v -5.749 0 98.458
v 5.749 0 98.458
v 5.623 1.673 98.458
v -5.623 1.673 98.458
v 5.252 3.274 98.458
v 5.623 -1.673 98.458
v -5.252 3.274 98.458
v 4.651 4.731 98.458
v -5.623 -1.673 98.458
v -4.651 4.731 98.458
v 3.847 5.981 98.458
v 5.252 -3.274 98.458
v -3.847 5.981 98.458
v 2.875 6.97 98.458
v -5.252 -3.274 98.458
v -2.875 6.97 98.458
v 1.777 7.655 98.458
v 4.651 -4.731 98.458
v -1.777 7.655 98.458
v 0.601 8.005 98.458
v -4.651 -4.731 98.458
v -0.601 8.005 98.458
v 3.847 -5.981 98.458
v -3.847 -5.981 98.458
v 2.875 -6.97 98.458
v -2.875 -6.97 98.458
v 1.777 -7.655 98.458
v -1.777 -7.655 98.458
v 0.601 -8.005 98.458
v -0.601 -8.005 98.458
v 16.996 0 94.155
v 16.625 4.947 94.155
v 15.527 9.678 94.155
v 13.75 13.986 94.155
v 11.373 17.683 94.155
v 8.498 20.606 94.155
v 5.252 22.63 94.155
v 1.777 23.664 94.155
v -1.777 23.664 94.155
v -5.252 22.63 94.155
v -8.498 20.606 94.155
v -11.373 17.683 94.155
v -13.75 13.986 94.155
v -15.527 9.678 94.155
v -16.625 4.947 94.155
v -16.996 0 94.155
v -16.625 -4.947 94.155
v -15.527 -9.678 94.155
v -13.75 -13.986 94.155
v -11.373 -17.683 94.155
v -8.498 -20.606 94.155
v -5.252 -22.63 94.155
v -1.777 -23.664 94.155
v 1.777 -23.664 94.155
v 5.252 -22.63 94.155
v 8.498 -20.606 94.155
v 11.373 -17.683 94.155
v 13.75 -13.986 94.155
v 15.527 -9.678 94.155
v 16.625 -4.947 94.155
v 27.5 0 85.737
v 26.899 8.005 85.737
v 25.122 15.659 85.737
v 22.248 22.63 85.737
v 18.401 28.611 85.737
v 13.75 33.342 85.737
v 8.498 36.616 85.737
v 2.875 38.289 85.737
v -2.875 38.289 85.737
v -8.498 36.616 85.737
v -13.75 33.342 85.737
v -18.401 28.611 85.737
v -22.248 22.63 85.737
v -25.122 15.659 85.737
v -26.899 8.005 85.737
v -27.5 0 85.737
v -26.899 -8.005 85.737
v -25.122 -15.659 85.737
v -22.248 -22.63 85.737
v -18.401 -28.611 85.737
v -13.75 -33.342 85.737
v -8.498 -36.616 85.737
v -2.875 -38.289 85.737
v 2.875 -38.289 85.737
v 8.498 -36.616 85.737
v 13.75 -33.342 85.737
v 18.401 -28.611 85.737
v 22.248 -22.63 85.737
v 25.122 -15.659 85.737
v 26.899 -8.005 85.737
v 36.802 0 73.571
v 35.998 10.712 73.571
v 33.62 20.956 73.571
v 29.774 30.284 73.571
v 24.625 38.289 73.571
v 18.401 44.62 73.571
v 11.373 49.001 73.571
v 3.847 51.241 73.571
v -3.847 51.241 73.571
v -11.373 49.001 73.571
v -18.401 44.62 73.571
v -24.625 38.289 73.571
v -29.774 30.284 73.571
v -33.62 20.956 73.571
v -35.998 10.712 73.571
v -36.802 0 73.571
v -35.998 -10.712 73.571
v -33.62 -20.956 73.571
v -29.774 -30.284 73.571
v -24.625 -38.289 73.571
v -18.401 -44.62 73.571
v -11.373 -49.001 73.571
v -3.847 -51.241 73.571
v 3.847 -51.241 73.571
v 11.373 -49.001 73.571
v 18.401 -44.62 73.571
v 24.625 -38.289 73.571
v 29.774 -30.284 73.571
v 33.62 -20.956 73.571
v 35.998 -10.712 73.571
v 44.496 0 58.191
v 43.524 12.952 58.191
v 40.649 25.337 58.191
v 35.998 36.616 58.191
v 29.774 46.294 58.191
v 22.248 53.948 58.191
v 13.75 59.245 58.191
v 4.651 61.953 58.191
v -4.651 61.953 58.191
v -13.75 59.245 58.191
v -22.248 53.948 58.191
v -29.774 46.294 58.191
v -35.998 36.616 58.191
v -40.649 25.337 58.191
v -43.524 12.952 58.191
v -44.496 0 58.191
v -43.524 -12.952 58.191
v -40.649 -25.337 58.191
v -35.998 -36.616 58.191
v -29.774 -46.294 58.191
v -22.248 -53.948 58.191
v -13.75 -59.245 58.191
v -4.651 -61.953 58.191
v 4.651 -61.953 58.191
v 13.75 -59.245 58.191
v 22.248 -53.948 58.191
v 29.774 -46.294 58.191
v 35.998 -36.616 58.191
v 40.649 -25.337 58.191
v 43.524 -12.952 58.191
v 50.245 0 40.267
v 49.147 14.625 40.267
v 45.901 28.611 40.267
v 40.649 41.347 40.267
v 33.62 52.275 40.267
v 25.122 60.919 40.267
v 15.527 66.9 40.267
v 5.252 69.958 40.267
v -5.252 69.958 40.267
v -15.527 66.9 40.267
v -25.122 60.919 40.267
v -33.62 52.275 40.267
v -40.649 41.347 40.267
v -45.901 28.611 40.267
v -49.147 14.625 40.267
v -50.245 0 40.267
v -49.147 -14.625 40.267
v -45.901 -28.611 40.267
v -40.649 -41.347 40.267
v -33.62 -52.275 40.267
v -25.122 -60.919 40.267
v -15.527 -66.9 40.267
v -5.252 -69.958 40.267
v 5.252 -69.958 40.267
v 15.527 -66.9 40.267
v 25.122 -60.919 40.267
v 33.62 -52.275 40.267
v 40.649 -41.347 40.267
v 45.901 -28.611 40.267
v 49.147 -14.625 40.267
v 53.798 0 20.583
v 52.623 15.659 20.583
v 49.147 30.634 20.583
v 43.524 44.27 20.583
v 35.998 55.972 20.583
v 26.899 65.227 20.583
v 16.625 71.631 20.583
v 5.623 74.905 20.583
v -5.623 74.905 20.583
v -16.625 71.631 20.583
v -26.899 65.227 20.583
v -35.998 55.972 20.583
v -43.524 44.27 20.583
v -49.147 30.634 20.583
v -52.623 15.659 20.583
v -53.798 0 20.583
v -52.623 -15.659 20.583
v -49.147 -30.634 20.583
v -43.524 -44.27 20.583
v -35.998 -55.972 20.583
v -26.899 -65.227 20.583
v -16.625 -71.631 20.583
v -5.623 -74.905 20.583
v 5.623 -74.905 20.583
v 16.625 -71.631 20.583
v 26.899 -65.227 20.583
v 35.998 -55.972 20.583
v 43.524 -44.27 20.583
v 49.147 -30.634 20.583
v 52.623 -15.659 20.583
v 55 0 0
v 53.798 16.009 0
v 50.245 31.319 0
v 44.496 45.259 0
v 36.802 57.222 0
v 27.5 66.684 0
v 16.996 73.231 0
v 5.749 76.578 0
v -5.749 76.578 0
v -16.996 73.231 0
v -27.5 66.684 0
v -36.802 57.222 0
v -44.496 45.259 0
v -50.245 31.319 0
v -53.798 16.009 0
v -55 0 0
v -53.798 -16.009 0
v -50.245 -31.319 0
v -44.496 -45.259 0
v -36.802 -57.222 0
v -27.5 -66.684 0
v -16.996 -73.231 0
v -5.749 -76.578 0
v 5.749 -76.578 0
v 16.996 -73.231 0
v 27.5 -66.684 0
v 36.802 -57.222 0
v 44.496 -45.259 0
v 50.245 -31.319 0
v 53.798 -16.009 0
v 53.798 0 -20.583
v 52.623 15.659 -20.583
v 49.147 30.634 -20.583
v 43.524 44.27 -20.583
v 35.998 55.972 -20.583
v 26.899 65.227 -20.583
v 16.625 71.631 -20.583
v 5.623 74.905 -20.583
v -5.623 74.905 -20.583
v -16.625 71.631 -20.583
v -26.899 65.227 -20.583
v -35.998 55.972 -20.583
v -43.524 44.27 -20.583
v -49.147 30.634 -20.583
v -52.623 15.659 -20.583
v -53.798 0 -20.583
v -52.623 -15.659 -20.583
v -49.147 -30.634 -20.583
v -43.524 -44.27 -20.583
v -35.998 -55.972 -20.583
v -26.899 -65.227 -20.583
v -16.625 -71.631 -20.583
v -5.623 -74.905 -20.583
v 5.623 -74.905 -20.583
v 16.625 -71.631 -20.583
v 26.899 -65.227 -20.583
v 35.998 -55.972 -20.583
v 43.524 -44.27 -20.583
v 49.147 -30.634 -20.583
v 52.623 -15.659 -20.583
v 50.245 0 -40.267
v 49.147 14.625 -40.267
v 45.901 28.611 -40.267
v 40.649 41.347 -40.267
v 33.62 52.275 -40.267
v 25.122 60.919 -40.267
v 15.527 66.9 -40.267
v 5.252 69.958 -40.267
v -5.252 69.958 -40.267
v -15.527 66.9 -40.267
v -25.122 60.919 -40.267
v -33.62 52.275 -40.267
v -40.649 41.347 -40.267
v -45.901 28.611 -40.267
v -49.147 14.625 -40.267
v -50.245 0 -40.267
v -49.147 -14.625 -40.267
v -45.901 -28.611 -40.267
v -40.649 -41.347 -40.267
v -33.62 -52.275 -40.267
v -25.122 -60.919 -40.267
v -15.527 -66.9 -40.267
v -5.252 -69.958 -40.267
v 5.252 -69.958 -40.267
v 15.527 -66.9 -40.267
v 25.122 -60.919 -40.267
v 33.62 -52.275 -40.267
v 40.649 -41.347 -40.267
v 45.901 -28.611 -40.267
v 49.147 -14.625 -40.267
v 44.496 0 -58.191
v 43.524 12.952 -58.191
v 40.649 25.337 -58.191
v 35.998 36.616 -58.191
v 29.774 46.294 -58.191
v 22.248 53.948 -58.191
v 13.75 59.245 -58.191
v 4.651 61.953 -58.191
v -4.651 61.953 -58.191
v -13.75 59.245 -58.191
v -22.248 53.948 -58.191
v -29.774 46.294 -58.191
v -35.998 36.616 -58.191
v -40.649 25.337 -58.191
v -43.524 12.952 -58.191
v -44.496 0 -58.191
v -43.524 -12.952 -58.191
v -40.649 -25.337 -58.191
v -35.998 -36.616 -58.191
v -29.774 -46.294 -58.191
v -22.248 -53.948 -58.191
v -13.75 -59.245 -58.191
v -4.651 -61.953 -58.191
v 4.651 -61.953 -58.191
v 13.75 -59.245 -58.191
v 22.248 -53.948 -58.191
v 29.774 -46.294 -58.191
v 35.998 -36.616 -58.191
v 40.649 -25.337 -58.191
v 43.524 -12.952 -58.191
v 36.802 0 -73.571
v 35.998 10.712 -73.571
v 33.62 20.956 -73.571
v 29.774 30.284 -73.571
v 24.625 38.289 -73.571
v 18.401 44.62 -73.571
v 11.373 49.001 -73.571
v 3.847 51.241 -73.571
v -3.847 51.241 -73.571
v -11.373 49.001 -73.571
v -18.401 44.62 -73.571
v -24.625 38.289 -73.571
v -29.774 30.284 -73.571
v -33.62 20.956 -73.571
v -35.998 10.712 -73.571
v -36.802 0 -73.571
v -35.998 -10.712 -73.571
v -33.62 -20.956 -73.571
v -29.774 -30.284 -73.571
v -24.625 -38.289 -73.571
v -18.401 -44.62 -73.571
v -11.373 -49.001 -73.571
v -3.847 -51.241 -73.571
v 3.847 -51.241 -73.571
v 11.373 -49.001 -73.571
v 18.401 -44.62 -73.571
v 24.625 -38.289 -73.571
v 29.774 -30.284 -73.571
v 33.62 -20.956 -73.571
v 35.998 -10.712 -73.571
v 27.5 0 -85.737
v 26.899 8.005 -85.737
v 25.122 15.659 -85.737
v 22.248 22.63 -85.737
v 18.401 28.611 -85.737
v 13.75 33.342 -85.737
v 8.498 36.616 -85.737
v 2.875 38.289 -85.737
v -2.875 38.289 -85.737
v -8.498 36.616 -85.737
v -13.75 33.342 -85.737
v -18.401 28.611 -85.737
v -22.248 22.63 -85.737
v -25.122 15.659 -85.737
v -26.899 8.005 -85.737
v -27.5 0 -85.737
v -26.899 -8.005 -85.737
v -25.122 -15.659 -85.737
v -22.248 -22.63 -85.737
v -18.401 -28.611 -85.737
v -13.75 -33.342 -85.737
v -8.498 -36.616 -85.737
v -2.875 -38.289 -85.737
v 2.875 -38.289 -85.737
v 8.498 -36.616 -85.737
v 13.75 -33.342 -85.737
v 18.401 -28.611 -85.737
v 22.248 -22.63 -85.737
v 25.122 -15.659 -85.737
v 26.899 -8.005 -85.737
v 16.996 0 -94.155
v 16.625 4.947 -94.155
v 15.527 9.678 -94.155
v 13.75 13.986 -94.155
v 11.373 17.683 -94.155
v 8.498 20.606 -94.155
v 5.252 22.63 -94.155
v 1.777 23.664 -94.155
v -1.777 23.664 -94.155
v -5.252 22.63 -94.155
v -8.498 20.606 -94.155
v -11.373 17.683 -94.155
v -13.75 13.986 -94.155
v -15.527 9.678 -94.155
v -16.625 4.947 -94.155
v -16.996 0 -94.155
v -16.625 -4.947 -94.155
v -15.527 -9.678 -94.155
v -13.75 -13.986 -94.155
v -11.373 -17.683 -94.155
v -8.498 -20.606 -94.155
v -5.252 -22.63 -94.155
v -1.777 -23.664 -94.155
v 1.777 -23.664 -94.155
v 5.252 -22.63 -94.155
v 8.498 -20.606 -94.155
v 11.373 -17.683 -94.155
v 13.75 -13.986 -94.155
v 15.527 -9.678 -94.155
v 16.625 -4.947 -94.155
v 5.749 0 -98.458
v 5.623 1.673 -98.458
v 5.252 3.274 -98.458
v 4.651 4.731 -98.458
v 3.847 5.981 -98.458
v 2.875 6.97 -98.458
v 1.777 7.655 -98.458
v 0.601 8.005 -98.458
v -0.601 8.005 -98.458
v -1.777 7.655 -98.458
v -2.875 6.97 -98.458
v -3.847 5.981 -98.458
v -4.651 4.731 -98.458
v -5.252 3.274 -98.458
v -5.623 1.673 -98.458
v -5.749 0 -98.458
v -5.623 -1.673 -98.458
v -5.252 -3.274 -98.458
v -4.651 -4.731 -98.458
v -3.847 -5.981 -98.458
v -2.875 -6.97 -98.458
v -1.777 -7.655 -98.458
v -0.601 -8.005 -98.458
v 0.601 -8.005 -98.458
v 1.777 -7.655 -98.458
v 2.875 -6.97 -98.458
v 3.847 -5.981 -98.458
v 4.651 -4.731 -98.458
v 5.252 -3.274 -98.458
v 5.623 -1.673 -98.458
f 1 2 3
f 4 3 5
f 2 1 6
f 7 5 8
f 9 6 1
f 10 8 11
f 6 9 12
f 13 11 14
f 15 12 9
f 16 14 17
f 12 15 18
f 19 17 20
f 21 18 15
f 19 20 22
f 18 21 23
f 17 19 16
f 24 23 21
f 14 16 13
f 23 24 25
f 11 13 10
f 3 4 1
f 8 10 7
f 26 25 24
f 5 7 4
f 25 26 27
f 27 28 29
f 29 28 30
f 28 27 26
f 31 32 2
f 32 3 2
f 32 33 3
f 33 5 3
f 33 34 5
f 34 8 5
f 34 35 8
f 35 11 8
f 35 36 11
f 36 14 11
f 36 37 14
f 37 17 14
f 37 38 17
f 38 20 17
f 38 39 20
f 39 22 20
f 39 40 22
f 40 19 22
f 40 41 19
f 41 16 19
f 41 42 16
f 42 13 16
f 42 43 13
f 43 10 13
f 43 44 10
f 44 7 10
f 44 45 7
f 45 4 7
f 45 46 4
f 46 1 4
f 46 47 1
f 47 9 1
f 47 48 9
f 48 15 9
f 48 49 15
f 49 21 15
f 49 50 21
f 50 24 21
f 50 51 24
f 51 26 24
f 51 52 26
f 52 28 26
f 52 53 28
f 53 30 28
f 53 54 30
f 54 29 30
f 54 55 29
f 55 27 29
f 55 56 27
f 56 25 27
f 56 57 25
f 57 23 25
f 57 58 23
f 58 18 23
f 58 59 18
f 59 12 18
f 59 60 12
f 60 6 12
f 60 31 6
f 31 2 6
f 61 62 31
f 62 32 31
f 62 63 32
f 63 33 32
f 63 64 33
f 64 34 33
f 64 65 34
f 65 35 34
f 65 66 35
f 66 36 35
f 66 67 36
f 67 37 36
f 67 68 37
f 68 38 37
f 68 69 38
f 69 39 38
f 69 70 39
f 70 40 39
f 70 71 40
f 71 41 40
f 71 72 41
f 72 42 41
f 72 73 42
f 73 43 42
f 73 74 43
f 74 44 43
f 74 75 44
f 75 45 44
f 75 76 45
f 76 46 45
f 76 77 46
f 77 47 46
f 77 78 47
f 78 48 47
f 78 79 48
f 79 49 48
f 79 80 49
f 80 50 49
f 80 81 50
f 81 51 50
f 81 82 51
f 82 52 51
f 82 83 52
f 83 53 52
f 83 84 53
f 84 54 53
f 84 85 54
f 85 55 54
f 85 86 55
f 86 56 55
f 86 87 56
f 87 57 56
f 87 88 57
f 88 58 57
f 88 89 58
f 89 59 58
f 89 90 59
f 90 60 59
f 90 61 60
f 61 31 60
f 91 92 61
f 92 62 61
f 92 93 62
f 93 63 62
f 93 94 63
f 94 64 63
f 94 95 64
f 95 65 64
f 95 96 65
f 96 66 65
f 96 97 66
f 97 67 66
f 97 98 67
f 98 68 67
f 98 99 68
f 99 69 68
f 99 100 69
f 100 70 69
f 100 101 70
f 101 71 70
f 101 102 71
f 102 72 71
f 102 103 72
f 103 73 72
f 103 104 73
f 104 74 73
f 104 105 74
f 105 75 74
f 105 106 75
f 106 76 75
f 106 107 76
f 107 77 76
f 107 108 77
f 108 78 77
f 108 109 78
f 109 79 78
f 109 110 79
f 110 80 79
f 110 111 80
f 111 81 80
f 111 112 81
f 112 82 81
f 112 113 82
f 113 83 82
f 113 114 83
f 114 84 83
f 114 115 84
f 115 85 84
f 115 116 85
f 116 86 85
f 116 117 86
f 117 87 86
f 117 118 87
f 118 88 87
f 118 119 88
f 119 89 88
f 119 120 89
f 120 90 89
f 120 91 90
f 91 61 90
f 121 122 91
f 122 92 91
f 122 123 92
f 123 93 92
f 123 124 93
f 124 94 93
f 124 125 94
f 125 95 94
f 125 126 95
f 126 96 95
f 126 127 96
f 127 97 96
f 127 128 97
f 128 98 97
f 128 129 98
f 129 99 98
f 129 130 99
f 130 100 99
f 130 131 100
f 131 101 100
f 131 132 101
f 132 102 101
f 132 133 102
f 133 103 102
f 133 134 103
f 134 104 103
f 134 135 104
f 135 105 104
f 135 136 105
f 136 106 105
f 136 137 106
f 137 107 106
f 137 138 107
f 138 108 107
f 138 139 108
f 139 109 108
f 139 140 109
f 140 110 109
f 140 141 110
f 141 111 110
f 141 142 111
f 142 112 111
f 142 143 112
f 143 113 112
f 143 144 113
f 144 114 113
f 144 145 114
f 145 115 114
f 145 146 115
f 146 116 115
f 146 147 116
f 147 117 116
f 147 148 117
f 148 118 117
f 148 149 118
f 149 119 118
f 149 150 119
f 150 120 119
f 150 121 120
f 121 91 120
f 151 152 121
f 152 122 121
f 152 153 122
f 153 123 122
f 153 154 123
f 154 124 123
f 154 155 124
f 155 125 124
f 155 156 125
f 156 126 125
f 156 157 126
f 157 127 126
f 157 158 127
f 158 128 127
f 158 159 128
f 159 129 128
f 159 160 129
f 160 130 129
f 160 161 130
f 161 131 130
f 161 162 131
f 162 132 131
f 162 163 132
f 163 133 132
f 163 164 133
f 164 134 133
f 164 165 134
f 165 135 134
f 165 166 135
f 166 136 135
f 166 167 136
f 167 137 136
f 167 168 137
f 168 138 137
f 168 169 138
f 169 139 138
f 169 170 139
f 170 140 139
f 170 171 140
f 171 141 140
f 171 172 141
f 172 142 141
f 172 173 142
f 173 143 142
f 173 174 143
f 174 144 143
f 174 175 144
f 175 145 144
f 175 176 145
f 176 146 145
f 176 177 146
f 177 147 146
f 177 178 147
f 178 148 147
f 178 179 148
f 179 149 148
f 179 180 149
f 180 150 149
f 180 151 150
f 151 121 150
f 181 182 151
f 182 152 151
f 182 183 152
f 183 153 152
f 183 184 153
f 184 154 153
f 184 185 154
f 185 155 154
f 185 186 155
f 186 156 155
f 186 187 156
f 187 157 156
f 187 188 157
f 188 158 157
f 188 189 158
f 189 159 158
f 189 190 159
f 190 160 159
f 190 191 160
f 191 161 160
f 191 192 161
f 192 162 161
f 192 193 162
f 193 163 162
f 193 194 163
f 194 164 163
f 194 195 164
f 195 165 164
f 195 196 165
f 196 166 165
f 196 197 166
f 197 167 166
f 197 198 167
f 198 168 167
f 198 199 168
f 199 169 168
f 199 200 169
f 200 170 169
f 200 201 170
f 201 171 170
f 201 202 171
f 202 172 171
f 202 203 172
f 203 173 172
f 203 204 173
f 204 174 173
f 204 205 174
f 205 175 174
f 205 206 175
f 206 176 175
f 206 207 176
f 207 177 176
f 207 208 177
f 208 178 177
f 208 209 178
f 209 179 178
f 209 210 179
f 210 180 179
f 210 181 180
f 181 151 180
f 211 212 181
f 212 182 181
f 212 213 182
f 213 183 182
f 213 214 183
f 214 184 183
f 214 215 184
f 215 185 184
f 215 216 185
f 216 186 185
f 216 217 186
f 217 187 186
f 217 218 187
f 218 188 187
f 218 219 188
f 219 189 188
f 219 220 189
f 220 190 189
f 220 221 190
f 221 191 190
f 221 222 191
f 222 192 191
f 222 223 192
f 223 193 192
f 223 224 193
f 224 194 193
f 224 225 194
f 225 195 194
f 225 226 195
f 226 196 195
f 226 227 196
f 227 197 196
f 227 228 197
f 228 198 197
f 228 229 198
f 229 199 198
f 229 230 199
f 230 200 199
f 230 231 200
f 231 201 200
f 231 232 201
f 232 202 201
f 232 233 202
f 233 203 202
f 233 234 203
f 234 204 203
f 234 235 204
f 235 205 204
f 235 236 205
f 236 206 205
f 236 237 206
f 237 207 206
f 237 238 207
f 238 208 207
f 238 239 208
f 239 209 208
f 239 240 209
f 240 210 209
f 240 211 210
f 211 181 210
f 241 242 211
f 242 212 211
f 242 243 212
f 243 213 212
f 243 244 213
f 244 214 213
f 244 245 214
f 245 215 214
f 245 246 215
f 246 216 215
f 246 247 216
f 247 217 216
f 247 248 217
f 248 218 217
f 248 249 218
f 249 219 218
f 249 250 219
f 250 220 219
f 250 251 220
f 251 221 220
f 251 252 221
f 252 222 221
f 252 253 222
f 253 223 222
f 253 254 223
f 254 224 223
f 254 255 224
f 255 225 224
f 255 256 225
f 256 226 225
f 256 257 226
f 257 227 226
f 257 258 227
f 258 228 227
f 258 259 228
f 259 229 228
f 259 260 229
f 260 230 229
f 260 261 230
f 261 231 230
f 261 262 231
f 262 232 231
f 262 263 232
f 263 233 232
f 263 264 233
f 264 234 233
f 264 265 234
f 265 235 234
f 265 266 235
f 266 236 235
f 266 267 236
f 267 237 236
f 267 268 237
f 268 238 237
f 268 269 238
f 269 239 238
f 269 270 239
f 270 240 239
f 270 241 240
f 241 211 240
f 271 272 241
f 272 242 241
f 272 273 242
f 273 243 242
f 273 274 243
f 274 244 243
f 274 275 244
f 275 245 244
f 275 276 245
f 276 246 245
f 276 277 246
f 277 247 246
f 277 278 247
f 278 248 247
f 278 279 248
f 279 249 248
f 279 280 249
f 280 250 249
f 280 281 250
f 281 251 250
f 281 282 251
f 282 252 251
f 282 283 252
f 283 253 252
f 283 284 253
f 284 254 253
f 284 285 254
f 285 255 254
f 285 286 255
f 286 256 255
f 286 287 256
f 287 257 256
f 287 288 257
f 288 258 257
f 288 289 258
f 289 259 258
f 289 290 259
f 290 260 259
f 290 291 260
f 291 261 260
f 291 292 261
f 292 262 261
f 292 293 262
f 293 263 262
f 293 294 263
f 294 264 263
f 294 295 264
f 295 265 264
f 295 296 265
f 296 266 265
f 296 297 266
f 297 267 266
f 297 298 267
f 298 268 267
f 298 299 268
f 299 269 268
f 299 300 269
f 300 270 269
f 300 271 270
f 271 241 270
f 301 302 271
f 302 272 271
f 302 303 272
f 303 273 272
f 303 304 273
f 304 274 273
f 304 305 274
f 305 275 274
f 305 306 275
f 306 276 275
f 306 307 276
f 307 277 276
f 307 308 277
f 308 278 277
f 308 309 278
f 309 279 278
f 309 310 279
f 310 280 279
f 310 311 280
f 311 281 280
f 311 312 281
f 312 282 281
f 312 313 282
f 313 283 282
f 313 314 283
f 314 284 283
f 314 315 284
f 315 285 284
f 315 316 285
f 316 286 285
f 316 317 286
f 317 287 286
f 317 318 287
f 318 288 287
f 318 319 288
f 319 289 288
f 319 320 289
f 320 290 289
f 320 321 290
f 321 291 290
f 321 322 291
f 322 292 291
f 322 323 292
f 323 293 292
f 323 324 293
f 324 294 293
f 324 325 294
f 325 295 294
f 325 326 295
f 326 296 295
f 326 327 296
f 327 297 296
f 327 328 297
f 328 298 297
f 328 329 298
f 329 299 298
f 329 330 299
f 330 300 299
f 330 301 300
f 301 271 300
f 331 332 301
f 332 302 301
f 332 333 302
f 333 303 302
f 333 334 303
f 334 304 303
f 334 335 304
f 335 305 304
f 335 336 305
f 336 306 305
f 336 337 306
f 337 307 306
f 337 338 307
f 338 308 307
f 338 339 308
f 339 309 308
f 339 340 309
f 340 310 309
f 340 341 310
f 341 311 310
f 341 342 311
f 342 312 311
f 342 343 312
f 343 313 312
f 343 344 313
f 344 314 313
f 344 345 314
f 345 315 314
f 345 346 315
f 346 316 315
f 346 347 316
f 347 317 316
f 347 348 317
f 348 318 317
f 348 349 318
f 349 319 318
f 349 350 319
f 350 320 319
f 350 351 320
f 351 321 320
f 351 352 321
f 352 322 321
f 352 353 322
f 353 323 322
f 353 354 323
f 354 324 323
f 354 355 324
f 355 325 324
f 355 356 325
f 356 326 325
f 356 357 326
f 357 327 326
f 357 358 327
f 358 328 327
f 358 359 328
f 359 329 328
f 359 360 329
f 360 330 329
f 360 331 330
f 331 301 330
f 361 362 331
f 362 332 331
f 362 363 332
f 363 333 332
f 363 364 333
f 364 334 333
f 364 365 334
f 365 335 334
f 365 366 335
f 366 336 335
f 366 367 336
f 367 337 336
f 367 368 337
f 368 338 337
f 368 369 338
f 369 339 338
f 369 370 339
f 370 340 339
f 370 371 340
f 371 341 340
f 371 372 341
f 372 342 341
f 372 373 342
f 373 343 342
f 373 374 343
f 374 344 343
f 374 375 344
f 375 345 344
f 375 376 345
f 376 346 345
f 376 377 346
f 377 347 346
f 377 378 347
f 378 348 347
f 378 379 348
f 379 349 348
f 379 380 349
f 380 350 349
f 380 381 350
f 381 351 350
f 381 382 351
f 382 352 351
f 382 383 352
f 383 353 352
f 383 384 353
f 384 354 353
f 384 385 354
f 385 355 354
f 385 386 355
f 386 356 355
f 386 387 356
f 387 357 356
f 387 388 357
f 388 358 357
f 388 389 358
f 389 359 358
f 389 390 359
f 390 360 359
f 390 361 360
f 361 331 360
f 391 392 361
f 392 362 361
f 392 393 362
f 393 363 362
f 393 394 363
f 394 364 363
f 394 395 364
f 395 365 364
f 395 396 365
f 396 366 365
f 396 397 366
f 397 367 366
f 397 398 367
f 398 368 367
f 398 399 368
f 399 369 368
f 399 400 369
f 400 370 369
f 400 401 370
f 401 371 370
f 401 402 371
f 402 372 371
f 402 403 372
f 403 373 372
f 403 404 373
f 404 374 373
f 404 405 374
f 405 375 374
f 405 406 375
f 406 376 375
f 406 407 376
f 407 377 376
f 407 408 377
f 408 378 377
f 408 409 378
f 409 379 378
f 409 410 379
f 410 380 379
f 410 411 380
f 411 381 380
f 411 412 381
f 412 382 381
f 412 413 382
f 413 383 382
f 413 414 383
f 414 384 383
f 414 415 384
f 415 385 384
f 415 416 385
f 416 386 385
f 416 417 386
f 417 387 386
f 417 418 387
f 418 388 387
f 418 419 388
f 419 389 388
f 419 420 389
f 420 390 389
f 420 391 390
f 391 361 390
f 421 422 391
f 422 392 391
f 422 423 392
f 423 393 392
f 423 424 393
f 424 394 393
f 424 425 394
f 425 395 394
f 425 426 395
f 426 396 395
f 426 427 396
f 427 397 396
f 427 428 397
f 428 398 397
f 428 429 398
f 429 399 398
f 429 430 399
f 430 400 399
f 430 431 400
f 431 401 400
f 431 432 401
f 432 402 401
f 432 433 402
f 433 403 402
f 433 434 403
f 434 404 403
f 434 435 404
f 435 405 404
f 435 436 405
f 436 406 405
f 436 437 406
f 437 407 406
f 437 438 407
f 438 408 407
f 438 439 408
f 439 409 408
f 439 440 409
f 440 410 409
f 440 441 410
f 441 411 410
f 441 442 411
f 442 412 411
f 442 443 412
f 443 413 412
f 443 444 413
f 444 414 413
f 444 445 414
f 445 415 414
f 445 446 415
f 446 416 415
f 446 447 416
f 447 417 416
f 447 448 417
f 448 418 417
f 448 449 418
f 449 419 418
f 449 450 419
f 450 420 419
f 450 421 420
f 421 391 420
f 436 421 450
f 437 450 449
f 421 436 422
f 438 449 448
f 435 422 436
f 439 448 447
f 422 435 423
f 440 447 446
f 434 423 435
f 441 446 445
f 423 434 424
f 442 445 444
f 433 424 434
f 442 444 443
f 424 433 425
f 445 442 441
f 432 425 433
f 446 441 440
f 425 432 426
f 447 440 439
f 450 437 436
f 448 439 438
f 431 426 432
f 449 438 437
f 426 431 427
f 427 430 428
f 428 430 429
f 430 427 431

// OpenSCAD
// Generated by SolidPython 1.0.1 on 2020-07-29 00:39:25


scale(v = [5, 7, 9]) {
	sphere(r = 11);
}
/***********************************************
*********      SolidPython code:      **********
************************************************
 
# import packages: SolidPython
from solid import *
from solid.utils import *
from itertools import chain, combinations


class Resize:

    def __init__(self, scad_file):
        self.scad_file = scad_file
        #self.scad_file = import_scad(scad_file)
        # cone/cylinder param:
        self.r1 = 0
        self.r2 = 0
        self.h = 0
        # rectangular prism param:
        self.w = 0
        self.l = 0
        # ellipse param:
        self.r = 0

    # import OpenScad code (file name corresponds to shape)


    # classify shape + parameters
    def assign(self, param1, param2, param3):
        if self.scad_file == 'cone.scad':
            self.r1 = param1
            self.r2 = param2
            self.h = param3
        elif self.scad_file == 'cylinder.scad':
            self.r1 = param1
            self.r2 = param2
            self.h = param3
        elif self.scad_file == 'rectangularPrism.scad':
            self.h = param1
            self.l = param2
            self.w = param3
        else:
            self.r = param1
            self.h = param2

    # resize parameters
    def iterate(self):
        x = range(3, 20, 2)
        i = 1
        if self.scad_file == 'cone.scad':
            tempList = list(combinations(x, 2))
            for temp in tempList:
                param1 = temp[0]
                param2 = temp[1]
                filepath = 'produced_scad_files/' + 'cone' + str(param1) + '_' + str(param2) + '_' + '.scad'
                scad_render_to_file(cylinder(h=param1, r1=param2, r2=0), filepath)

        elif self.scad_file == 'cylinder.scad':
            tempList = list(combinations(x, 3))
            for temp in tempList:
                param1 = temp[0]
                param2 = temp[1]
                filepath = 'produced_scad_files/' + 'cylinder' + str(param1) + '_' + str(param2) + '_' + '.scad'
                scad_render_to_file(cylinder(h=param1, r1=param2, r2=param2), filepath)

        elif self.scad_file == 'rectangularPrism.scad':
            tempList = list(combinations(x, 3))
            for temp in tempList:
                param1 = temp[0]
                param2 = temp[1]
                param3 = temp[2]
                filepath = 'produced_scad_files/' + 'rectangularPrism' + str(param1) + '_' + str(param2) + '_' + str(
                    param3) + '.scad'
                scad_render_to_file(cube(size=(param1, param2, param3)), filepath)

        elif self.scad_file == 'ellipse.scad':
            tempList = list(combinations(x, 4))
            for temp in tempList:
                param1 = temp[0]
                param2 = temp[1]
                param3 = temp[2]
                param4 = temp[3]
                filepath = 'produced_scad_files/' + 'ellipse' + str(param1) + '_' + str(param2) + '_' + str(param3) + '_' + str(param4) + '.scad'
                scad_render_to_file(scale([param1, param2, param3])(sphere(r=param4)), filepath)

    def render_to_scadfile(self):
        scad_render_to_file(scad, 'example.scad') 
 
************************************************/
